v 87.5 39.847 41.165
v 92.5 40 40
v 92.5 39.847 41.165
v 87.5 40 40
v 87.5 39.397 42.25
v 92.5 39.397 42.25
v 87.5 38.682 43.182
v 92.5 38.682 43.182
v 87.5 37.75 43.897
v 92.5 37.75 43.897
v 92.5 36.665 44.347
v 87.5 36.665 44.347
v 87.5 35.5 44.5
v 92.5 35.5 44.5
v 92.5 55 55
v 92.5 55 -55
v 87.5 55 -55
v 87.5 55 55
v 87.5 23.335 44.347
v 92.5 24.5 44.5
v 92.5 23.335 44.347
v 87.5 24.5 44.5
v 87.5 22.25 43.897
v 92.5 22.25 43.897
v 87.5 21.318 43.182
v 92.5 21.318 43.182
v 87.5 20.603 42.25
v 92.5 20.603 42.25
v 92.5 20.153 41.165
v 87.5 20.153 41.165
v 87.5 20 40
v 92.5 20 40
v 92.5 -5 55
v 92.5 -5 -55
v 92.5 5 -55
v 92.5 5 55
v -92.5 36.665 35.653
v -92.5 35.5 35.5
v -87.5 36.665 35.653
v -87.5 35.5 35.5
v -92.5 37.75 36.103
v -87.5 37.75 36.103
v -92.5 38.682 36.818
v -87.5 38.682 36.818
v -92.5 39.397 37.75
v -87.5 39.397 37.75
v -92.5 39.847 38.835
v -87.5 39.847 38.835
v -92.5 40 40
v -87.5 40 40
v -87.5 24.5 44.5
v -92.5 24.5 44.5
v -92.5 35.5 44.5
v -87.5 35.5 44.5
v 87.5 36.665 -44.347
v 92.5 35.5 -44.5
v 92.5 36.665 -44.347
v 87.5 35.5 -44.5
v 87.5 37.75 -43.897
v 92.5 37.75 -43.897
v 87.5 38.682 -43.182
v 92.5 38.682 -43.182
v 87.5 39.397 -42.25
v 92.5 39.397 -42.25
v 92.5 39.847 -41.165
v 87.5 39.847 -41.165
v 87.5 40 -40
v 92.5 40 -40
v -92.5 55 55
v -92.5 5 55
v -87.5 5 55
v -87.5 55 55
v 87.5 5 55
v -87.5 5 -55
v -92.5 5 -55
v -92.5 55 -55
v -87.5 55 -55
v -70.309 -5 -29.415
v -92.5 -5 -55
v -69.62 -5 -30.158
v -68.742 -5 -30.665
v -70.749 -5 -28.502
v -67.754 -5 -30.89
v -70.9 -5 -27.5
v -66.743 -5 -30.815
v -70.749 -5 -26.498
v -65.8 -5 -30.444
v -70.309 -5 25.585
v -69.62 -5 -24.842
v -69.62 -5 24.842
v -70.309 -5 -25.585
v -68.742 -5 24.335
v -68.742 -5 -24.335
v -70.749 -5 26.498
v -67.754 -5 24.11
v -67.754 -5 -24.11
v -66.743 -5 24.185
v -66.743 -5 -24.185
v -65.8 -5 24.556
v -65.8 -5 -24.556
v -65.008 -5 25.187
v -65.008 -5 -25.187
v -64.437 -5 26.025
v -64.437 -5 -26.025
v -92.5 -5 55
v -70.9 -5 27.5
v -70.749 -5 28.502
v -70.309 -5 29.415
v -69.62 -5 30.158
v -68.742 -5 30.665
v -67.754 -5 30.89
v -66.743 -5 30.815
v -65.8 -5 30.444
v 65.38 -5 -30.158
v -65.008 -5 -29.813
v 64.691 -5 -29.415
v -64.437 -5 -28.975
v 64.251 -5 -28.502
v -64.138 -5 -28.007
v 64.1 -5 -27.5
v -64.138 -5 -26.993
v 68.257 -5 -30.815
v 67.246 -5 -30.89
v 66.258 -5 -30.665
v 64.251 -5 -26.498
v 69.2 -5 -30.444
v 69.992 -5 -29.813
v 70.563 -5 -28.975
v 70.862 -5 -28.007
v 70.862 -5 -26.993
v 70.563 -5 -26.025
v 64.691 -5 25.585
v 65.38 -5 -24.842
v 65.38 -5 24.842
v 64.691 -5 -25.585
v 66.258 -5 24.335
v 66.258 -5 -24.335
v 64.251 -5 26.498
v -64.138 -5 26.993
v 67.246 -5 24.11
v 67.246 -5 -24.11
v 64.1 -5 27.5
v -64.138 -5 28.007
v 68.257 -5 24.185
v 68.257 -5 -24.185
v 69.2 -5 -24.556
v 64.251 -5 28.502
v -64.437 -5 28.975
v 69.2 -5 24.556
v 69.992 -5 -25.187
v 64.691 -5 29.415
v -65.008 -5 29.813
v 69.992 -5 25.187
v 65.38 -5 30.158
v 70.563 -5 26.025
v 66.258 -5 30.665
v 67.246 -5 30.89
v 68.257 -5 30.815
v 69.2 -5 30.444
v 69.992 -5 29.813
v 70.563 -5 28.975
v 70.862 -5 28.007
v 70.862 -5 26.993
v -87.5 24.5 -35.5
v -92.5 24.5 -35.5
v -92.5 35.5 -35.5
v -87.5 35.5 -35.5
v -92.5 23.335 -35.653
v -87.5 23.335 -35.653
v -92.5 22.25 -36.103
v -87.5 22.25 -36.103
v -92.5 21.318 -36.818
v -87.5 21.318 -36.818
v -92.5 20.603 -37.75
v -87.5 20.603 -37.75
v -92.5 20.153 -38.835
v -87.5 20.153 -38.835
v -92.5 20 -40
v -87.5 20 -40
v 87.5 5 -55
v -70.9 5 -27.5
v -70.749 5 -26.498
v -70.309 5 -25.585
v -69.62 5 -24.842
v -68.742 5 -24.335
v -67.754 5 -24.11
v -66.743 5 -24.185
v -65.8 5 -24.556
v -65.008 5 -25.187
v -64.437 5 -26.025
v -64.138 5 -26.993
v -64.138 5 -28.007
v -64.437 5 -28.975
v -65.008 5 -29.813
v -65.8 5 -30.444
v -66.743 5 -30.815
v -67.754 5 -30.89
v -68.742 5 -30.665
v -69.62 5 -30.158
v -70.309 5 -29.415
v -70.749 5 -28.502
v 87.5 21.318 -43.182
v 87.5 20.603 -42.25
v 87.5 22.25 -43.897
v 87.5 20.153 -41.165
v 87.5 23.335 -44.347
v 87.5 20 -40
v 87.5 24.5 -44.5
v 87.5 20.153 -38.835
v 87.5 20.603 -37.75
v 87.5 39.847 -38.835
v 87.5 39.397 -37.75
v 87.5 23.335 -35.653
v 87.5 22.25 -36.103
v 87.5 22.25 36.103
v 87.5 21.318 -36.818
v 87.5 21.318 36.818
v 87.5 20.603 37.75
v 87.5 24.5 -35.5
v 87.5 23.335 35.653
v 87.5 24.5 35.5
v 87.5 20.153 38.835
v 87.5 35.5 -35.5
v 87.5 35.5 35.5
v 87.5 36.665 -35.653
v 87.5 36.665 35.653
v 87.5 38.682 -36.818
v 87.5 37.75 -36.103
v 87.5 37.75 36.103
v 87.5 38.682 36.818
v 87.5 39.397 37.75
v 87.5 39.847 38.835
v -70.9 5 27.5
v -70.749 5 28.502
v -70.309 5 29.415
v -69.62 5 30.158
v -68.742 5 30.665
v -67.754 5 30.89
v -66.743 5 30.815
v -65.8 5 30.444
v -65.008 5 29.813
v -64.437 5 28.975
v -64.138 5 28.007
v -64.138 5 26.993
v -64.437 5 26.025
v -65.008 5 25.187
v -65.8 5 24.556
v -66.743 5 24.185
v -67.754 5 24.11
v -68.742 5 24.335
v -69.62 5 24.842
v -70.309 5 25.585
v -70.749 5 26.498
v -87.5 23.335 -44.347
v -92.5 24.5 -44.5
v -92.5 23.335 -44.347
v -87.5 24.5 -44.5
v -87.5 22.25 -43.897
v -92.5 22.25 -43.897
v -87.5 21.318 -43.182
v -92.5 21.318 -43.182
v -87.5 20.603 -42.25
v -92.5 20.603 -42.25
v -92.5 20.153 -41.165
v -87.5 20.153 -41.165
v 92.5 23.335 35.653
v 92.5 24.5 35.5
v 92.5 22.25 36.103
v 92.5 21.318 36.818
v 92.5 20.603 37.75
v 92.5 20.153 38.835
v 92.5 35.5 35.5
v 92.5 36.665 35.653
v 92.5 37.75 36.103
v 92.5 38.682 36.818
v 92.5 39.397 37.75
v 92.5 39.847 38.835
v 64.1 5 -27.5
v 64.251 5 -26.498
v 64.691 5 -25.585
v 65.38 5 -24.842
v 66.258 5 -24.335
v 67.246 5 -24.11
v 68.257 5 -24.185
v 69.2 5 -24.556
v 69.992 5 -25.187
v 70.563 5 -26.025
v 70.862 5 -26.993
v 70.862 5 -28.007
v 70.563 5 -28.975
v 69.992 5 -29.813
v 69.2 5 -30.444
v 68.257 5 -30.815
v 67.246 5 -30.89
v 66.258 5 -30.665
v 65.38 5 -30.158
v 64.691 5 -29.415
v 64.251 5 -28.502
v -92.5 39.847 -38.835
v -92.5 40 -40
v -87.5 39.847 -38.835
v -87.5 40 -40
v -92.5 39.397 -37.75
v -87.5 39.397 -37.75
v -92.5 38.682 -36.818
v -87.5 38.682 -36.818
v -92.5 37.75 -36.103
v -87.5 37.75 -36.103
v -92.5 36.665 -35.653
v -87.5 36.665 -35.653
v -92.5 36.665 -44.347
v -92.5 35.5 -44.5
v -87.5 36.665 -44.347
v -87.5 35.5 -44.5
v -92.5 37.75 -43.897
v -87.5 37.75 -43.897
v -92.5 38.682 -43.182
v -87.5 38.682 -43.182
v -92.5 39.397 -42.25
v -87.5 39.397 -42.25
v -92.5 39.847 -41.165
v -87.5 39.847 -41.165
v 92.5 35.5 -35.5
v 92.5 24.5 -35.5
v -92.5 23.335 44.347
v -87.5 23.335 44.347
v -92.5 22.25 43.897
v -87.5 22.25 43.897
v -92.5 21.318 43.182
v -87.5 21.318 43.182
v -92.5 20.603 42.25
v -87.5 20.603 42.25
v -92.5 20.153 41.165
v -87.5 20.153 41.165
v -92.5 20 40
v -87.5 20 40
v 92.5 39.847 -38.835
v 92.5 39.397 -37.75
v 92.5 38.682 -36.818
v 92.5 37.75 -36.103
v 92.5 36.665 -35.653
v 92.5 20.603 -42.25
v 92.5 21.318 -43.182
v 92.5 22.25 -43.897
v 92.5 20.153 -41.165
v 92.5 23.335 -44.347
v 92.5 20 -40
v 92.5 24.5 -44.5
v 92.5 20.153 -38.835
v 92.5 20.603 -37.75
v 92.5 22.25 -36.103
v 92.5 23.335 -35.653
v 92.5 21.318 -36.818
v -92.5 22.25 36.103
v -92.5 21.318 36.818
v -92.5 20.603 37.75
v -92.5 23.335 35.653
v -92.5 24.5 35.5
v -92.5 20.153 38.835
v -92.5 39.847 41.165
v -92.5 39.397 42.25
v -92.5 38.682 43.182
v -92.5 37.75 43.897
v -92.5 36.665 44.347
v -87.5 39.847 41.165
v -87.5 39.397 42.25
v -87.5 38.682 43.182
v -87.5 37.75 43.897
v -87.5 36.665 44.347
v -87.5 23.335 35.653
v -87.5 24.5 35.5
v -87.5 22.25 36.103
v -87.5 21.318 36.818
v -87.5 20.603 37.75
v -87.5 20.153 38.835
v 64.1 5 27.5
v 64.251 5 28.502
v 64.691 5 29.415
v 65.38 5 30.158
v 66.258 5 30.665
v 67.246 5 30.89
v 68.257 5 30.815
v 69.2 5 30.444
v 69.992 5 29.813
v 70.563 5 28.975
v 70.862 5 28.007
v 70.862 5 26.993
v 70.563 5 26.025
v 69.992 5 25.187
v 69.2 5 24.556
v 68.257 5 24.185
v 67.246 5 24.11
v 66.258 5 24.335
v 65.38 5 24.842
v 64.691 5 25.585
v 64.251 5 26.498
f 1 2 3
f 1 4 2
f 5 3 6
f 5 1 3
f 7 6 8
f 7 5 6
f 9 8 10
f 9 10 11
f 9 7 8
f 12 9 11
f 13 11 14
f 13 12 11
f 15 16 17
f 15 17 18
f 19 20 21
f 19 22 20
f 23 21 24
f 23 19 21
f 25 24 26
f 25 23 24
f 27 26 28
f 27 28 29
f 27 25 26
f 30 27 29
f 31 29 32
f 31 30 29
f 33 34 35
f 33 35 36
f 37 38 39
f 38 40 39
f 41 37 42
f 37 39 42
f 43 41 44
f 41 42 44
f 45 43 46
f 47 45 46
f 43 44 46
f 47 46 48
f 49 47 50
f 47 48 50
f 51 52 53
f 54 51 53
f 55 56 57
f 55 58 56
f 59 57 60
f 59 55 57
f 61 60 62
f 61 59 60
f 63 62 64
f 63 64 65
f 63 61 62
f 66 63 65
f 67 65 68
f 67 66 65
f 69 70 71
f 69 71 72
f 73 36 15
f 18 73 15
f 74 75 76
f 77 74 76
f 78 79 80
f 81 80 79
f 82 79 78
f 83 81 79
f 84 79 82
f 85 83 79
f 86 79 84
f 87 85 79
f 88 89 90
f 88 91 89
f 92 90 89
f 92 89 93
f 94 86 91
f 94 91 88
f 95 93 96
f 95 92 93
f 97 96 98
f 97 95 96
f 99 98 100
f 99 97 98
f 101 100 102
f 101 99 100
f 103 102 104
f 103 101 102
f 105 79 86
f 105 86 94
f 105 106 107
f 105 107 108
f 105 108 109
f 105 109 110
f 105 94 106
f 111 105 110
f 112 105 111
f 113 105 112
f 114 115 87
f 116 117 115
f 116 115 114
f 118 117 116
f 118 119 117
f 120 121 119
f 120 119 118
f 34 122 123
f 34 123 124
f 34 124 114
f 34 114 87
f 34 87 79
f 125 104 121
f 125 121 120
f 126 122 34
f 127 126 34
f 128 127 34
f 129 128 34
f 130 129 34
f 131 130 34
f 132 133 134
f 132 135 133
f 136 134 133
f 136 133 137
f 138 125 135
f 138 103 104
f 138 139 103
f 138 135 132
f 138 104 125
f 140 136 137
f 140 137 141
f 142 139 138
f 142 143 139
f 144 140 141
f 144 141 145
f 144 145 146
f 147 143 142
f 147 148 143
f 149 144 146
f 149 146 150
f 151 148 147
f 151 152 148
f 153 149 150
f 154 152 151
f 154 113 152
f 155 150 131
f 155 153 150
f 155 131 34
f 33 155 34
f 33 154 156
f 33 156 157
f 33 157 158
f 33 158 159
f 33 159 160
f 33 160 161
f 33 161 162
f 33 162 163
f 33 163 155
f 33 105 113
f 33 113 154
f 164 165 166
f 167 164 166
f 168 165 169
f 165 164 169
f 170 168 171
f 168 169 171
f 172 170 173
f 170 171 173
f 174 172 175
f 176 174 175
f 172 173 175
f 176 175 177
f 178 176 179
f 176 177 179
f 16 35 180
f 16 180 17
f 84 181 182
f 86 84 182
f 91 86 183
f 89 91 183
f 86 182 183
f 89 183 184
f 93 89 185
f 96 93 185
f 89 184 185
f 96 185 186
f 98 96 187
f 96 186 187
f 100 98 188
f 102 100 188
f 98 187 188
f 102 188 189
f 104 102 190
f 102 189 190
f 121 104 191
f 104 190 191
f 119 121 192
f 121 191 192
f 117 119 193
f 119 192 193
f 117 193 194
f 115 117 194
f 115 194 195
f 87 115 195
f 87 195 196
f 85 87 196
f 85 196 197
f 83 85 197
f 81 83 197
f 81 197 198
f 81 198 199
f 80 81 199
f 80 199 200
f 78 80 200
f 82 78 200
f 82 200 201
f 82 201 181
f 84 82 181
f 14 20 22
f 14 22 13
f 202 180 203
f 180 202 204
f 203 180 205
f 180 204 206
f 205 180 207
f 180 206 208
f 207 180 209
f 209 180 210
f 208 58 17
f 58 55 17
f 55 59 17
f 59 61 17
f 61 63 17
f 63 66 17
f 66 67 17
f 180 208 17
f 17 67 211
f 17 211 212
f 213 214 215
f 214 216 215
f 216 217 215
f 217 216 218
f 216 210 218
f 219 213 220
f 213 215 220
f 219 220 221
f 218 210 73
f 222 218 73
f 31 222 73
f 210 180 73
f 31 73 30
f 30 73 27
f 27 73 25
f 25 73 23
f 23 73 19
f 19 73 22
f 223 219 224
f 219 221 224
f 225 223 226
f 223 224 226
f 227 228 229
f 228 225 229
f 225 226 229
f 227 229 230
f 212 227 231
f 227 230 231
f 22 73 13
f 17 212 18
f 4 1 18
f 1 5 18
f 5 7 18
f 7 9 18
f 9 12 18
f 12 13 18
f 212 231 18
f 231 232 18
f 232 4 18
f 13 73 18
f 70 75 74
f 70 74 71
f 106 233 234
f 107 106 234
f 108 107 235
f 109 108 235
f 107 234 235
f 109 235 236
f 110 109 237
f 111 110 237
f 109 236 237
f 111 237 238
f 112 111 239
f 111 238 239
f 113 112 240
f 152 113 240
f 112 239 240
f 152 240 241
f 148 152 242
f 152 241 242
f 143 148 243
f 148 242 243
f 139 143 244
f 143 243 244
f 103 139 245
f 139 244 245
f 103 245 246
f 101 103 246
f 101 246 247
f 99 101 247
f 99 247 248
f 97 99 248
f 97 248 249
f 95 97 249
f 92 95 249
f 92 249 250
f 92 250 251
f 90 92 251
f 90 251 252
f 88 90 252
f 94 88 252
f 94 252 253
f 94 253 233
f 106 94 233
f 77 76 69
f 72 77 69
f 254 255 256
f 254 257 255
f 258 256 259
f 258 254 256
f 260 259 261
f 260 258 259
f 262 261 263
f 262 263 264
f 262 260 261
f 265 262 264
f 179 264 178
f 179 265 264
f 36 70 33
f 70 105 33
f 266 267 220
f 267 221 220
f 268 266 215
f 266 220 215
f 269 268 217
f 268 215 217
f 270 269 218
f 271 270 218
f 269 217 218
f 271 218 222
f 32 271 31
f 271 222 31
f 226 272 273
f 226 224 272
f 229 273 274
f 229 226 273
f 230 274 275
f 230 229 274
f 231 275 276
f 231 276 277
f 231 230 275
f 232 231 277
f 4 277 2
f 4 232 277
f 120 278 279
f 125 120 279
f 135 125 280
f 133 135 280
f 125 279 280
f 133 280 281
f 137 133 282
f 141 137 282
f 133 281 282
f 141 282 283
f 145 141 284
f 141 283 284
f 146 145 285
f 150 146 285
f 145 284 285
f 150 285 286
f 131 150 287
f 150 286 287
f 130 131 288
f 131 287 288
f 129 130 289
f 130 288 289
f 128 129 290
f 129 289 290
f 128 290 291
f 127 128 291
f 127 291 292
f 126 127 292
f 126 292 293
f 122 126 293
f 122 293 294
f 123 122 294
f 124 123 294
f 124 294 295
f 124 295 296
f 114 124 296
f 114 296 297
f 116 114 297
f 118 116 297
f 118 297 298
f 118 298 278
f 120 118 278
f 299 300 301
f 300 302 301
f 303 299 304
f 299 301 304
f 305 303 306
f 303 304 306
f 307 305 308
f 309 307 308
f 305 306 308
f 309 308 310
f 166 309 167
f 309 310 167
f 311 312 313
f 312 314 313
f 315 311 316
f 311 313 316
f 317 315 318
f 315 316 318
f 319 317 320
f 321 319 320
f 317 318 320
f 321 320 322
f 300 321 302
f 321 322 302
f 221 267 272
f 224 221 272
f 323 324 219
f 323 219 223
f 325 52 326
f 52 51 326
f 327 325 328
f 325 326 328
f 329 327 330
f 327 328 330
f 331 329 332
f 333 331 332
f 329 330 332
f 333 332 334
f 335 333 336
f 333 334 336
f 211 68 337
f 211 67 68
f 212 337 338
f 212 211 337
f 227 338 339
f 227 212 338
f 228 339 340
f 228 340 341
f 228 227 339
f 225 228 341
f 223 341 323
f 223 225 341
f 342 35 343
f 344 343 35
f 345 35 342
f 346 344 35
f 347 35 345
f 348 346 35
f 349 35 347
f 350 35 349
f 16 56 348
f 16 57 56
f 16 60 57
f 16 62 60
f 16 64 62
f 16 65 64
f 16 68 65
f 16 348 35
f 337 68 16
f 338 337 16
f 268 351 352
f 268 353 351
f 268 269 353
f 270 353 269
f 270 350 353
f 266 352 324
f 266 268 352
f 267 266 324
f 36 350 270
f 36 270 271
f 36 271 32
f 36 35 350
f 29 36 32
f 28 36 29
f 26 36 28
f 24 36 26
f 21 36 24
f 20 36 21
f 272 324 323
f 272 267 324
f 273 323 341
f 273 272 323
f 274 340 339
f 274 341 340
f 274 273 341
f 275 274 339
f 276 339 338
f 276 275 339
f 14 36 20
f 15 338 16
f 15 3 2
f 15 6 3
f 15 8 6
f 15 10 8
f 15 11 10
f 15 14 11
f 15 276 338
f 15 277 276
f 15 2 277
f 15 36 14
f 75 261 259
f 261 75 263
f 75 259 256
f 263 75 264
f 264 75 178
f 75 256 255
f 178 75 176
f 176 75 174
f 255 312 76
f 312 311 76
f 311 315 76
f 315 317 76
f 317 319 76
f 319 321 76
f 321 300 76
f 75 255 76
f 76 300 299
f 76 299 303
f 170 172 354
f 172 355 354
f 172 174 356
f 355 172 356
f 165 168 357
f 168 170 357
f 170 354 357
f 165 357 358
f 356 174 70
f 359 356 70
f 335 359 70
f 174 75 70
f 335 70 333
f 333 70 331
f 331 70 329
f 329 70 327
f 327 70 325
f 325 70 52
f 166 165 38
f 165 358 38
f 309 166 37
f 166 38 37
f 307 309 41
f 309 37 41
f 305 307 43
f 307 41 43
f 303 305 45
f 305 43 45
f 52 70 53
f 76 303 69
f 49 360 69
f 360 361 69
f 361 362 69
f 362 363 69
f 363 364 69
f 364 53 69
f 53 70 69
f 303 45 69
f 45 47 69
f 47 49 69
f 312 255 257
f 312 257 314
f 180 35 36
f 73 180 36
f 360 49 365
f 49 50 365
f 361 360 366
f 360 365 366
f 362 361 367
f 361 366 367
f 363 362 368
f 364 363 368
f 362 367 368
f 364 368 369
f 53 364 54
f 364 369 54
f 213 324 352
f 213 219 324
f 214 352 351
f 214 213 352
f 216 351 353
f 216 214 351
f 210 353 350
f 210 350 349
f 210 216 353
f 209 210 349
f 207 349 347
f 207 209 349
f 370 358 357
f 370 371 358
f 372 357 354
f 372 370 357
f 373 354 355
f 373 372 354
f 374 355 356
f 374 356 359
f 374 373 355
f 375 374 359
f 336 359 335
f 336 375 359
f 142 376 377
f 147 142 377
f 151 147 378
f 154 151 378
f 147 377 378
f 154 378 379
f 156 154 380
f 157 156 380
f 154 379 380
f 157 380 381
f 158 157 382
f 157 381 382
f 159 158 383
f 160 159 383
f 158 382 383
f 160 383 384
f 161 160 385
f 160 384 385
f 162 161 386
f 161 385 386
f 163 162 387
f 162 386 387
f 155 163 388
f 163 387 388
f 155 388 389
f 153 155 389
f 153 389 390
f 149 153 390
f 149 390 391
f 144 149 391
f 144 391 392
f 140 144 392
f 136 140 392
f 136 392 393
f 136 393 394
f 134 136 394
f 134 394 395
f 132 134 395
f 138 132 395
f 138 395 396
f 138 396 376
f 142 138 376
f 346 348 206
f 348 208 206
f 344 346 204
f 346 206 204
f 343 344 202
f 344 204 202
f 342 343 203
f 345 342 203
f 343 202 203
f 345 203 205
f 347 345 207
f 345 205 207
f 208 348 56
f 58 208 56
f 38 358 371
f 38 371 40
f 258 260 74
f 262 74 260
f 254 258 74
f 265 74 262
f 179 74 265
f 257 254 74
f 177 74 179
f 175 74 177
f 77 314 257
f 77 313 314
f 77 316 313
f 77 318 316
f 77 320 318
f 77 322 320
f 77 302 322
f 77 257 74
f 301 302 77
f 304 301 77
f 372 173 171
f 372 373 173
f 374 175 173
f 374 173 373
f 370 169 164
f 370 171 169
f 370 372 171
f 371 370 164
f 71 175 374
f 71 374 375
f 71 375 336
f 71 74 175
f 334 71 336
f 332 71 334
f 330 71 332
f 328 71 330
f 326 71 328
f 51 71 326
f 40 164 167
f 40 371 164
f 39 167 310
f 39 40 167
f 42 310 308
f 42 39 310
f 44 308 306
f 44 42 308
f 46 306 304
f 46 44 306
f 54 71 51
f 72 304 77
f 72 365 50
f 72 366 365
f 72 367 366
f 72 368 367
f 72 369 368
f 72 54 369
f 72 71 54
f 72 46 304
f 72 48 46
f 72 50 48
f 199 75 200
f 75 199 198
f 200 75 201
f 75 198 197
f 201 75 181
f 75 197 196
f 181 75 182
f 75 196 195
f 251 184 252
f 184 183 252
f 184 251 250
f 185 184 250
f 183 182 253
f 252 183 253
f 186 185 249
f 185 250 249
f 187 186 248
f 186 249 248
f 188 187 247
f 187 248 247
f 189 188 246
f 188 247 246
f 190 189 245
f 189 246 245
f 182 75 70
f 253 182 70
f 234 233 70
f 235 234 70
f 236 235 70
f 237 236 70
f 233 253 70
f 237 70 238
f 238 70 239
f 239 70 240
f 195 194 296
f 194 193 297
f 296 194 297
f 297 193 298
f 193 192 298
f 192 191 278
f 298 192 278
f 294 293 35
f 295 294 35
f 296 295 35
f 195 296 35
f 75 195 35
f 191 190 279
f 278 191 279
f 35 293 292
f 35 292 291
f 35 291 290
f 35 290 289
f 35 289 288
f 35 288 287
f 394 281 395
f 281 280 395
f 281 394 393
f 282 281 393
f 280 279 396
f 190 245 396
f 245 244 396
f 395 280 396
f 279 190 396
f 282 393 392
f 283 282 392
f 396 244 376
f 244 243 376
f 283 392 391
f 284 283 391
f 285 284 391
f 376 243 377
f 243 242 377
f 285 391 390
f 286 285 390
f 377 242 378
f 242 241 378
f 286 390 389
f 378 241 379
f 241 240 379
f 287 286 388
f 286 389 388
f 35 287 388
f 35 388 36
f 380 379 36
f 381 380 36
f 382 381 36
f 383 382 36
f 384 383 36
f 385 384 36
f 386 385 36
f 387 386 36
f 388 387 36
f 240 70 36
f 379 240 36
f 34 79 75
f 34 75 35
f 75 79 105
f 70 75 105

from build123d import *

# Parameters (mm, degrees)
F0_W     = 185
F0_H     = 110
F1_DEPTH = 5
F3_D     = 6.8
F4_W     = 50
F4_H     = 110
F5_DEPTH = 5
F6_W     = 20
F6_H     = 9
F7_DEPTH = 185.001
F8_R     = 4.49999


# Not quite as in the source:
# - a fillet or chamfer is up to 0.001 mm smaller than in the source, because OpenCascade refuses the exact size


with BuildPart() as f1:
    # F0 (on Front) → F1 (new body, symmetric)
    with BuildSketch(Plane.XZ):
        Rectangle(F0_W, F0_H)
    extrude(amount=F1_DEPTH, both=True)

    # F3 (through all)
    with Locations(Plane.XZ.offset(5)):
        with Locations((-67.5, 27.5), (-67.5, -27.5), (67.5, -27.5), (67.5, 27.5)):
            Hole(F3_D / 2)


with BuildPart() as f5:
    # F4 (on face) → F5 (new body)
    with BuildSketch(Plane.YZ.offset(92.5)):
        with Locations((30, 0)):
            Rectangle(F4_W, F4_H)
    extrude(amount=-F5_DEPTH)

    # F6 (on face) → F7 (cut, through all)
    with BuildSketch(Plane.YZ.offset(92.5)):
        with Locations((30, 40)):
            Rectangle(F6_W, F6_H)
        with Locations((30, -40)):
            Rectangle(F6_W, F6_H)
    extrude(amount=-F7_DEPTH, mode=Mode.SUBTRACT)

    # F8 (radius 4.5 in the source; OpenCascade refuses exactly that, so slightly less here)
    f8_edges = [f5.edges().sort_by_distance(p)[0] for p in [
        (90, 20, 35.5),
        (90, 20, 44.5),
        (90, 20, -35.5),
        (90, 20, -44.5),
        (90, 40, -35.5),
        (90, 40, 44.5),
        (90, 40, 35.5),
        (90, 40, -44.5),
    ]]
    fillet(f8_edges, radius=F8_R)


with BuildPart() as f9_1:
    # F9: instance of F5
    add(f5.part.mirror(Plane.YZ))


solid = Compound([f1.part, f5.part, f9_1.part])
